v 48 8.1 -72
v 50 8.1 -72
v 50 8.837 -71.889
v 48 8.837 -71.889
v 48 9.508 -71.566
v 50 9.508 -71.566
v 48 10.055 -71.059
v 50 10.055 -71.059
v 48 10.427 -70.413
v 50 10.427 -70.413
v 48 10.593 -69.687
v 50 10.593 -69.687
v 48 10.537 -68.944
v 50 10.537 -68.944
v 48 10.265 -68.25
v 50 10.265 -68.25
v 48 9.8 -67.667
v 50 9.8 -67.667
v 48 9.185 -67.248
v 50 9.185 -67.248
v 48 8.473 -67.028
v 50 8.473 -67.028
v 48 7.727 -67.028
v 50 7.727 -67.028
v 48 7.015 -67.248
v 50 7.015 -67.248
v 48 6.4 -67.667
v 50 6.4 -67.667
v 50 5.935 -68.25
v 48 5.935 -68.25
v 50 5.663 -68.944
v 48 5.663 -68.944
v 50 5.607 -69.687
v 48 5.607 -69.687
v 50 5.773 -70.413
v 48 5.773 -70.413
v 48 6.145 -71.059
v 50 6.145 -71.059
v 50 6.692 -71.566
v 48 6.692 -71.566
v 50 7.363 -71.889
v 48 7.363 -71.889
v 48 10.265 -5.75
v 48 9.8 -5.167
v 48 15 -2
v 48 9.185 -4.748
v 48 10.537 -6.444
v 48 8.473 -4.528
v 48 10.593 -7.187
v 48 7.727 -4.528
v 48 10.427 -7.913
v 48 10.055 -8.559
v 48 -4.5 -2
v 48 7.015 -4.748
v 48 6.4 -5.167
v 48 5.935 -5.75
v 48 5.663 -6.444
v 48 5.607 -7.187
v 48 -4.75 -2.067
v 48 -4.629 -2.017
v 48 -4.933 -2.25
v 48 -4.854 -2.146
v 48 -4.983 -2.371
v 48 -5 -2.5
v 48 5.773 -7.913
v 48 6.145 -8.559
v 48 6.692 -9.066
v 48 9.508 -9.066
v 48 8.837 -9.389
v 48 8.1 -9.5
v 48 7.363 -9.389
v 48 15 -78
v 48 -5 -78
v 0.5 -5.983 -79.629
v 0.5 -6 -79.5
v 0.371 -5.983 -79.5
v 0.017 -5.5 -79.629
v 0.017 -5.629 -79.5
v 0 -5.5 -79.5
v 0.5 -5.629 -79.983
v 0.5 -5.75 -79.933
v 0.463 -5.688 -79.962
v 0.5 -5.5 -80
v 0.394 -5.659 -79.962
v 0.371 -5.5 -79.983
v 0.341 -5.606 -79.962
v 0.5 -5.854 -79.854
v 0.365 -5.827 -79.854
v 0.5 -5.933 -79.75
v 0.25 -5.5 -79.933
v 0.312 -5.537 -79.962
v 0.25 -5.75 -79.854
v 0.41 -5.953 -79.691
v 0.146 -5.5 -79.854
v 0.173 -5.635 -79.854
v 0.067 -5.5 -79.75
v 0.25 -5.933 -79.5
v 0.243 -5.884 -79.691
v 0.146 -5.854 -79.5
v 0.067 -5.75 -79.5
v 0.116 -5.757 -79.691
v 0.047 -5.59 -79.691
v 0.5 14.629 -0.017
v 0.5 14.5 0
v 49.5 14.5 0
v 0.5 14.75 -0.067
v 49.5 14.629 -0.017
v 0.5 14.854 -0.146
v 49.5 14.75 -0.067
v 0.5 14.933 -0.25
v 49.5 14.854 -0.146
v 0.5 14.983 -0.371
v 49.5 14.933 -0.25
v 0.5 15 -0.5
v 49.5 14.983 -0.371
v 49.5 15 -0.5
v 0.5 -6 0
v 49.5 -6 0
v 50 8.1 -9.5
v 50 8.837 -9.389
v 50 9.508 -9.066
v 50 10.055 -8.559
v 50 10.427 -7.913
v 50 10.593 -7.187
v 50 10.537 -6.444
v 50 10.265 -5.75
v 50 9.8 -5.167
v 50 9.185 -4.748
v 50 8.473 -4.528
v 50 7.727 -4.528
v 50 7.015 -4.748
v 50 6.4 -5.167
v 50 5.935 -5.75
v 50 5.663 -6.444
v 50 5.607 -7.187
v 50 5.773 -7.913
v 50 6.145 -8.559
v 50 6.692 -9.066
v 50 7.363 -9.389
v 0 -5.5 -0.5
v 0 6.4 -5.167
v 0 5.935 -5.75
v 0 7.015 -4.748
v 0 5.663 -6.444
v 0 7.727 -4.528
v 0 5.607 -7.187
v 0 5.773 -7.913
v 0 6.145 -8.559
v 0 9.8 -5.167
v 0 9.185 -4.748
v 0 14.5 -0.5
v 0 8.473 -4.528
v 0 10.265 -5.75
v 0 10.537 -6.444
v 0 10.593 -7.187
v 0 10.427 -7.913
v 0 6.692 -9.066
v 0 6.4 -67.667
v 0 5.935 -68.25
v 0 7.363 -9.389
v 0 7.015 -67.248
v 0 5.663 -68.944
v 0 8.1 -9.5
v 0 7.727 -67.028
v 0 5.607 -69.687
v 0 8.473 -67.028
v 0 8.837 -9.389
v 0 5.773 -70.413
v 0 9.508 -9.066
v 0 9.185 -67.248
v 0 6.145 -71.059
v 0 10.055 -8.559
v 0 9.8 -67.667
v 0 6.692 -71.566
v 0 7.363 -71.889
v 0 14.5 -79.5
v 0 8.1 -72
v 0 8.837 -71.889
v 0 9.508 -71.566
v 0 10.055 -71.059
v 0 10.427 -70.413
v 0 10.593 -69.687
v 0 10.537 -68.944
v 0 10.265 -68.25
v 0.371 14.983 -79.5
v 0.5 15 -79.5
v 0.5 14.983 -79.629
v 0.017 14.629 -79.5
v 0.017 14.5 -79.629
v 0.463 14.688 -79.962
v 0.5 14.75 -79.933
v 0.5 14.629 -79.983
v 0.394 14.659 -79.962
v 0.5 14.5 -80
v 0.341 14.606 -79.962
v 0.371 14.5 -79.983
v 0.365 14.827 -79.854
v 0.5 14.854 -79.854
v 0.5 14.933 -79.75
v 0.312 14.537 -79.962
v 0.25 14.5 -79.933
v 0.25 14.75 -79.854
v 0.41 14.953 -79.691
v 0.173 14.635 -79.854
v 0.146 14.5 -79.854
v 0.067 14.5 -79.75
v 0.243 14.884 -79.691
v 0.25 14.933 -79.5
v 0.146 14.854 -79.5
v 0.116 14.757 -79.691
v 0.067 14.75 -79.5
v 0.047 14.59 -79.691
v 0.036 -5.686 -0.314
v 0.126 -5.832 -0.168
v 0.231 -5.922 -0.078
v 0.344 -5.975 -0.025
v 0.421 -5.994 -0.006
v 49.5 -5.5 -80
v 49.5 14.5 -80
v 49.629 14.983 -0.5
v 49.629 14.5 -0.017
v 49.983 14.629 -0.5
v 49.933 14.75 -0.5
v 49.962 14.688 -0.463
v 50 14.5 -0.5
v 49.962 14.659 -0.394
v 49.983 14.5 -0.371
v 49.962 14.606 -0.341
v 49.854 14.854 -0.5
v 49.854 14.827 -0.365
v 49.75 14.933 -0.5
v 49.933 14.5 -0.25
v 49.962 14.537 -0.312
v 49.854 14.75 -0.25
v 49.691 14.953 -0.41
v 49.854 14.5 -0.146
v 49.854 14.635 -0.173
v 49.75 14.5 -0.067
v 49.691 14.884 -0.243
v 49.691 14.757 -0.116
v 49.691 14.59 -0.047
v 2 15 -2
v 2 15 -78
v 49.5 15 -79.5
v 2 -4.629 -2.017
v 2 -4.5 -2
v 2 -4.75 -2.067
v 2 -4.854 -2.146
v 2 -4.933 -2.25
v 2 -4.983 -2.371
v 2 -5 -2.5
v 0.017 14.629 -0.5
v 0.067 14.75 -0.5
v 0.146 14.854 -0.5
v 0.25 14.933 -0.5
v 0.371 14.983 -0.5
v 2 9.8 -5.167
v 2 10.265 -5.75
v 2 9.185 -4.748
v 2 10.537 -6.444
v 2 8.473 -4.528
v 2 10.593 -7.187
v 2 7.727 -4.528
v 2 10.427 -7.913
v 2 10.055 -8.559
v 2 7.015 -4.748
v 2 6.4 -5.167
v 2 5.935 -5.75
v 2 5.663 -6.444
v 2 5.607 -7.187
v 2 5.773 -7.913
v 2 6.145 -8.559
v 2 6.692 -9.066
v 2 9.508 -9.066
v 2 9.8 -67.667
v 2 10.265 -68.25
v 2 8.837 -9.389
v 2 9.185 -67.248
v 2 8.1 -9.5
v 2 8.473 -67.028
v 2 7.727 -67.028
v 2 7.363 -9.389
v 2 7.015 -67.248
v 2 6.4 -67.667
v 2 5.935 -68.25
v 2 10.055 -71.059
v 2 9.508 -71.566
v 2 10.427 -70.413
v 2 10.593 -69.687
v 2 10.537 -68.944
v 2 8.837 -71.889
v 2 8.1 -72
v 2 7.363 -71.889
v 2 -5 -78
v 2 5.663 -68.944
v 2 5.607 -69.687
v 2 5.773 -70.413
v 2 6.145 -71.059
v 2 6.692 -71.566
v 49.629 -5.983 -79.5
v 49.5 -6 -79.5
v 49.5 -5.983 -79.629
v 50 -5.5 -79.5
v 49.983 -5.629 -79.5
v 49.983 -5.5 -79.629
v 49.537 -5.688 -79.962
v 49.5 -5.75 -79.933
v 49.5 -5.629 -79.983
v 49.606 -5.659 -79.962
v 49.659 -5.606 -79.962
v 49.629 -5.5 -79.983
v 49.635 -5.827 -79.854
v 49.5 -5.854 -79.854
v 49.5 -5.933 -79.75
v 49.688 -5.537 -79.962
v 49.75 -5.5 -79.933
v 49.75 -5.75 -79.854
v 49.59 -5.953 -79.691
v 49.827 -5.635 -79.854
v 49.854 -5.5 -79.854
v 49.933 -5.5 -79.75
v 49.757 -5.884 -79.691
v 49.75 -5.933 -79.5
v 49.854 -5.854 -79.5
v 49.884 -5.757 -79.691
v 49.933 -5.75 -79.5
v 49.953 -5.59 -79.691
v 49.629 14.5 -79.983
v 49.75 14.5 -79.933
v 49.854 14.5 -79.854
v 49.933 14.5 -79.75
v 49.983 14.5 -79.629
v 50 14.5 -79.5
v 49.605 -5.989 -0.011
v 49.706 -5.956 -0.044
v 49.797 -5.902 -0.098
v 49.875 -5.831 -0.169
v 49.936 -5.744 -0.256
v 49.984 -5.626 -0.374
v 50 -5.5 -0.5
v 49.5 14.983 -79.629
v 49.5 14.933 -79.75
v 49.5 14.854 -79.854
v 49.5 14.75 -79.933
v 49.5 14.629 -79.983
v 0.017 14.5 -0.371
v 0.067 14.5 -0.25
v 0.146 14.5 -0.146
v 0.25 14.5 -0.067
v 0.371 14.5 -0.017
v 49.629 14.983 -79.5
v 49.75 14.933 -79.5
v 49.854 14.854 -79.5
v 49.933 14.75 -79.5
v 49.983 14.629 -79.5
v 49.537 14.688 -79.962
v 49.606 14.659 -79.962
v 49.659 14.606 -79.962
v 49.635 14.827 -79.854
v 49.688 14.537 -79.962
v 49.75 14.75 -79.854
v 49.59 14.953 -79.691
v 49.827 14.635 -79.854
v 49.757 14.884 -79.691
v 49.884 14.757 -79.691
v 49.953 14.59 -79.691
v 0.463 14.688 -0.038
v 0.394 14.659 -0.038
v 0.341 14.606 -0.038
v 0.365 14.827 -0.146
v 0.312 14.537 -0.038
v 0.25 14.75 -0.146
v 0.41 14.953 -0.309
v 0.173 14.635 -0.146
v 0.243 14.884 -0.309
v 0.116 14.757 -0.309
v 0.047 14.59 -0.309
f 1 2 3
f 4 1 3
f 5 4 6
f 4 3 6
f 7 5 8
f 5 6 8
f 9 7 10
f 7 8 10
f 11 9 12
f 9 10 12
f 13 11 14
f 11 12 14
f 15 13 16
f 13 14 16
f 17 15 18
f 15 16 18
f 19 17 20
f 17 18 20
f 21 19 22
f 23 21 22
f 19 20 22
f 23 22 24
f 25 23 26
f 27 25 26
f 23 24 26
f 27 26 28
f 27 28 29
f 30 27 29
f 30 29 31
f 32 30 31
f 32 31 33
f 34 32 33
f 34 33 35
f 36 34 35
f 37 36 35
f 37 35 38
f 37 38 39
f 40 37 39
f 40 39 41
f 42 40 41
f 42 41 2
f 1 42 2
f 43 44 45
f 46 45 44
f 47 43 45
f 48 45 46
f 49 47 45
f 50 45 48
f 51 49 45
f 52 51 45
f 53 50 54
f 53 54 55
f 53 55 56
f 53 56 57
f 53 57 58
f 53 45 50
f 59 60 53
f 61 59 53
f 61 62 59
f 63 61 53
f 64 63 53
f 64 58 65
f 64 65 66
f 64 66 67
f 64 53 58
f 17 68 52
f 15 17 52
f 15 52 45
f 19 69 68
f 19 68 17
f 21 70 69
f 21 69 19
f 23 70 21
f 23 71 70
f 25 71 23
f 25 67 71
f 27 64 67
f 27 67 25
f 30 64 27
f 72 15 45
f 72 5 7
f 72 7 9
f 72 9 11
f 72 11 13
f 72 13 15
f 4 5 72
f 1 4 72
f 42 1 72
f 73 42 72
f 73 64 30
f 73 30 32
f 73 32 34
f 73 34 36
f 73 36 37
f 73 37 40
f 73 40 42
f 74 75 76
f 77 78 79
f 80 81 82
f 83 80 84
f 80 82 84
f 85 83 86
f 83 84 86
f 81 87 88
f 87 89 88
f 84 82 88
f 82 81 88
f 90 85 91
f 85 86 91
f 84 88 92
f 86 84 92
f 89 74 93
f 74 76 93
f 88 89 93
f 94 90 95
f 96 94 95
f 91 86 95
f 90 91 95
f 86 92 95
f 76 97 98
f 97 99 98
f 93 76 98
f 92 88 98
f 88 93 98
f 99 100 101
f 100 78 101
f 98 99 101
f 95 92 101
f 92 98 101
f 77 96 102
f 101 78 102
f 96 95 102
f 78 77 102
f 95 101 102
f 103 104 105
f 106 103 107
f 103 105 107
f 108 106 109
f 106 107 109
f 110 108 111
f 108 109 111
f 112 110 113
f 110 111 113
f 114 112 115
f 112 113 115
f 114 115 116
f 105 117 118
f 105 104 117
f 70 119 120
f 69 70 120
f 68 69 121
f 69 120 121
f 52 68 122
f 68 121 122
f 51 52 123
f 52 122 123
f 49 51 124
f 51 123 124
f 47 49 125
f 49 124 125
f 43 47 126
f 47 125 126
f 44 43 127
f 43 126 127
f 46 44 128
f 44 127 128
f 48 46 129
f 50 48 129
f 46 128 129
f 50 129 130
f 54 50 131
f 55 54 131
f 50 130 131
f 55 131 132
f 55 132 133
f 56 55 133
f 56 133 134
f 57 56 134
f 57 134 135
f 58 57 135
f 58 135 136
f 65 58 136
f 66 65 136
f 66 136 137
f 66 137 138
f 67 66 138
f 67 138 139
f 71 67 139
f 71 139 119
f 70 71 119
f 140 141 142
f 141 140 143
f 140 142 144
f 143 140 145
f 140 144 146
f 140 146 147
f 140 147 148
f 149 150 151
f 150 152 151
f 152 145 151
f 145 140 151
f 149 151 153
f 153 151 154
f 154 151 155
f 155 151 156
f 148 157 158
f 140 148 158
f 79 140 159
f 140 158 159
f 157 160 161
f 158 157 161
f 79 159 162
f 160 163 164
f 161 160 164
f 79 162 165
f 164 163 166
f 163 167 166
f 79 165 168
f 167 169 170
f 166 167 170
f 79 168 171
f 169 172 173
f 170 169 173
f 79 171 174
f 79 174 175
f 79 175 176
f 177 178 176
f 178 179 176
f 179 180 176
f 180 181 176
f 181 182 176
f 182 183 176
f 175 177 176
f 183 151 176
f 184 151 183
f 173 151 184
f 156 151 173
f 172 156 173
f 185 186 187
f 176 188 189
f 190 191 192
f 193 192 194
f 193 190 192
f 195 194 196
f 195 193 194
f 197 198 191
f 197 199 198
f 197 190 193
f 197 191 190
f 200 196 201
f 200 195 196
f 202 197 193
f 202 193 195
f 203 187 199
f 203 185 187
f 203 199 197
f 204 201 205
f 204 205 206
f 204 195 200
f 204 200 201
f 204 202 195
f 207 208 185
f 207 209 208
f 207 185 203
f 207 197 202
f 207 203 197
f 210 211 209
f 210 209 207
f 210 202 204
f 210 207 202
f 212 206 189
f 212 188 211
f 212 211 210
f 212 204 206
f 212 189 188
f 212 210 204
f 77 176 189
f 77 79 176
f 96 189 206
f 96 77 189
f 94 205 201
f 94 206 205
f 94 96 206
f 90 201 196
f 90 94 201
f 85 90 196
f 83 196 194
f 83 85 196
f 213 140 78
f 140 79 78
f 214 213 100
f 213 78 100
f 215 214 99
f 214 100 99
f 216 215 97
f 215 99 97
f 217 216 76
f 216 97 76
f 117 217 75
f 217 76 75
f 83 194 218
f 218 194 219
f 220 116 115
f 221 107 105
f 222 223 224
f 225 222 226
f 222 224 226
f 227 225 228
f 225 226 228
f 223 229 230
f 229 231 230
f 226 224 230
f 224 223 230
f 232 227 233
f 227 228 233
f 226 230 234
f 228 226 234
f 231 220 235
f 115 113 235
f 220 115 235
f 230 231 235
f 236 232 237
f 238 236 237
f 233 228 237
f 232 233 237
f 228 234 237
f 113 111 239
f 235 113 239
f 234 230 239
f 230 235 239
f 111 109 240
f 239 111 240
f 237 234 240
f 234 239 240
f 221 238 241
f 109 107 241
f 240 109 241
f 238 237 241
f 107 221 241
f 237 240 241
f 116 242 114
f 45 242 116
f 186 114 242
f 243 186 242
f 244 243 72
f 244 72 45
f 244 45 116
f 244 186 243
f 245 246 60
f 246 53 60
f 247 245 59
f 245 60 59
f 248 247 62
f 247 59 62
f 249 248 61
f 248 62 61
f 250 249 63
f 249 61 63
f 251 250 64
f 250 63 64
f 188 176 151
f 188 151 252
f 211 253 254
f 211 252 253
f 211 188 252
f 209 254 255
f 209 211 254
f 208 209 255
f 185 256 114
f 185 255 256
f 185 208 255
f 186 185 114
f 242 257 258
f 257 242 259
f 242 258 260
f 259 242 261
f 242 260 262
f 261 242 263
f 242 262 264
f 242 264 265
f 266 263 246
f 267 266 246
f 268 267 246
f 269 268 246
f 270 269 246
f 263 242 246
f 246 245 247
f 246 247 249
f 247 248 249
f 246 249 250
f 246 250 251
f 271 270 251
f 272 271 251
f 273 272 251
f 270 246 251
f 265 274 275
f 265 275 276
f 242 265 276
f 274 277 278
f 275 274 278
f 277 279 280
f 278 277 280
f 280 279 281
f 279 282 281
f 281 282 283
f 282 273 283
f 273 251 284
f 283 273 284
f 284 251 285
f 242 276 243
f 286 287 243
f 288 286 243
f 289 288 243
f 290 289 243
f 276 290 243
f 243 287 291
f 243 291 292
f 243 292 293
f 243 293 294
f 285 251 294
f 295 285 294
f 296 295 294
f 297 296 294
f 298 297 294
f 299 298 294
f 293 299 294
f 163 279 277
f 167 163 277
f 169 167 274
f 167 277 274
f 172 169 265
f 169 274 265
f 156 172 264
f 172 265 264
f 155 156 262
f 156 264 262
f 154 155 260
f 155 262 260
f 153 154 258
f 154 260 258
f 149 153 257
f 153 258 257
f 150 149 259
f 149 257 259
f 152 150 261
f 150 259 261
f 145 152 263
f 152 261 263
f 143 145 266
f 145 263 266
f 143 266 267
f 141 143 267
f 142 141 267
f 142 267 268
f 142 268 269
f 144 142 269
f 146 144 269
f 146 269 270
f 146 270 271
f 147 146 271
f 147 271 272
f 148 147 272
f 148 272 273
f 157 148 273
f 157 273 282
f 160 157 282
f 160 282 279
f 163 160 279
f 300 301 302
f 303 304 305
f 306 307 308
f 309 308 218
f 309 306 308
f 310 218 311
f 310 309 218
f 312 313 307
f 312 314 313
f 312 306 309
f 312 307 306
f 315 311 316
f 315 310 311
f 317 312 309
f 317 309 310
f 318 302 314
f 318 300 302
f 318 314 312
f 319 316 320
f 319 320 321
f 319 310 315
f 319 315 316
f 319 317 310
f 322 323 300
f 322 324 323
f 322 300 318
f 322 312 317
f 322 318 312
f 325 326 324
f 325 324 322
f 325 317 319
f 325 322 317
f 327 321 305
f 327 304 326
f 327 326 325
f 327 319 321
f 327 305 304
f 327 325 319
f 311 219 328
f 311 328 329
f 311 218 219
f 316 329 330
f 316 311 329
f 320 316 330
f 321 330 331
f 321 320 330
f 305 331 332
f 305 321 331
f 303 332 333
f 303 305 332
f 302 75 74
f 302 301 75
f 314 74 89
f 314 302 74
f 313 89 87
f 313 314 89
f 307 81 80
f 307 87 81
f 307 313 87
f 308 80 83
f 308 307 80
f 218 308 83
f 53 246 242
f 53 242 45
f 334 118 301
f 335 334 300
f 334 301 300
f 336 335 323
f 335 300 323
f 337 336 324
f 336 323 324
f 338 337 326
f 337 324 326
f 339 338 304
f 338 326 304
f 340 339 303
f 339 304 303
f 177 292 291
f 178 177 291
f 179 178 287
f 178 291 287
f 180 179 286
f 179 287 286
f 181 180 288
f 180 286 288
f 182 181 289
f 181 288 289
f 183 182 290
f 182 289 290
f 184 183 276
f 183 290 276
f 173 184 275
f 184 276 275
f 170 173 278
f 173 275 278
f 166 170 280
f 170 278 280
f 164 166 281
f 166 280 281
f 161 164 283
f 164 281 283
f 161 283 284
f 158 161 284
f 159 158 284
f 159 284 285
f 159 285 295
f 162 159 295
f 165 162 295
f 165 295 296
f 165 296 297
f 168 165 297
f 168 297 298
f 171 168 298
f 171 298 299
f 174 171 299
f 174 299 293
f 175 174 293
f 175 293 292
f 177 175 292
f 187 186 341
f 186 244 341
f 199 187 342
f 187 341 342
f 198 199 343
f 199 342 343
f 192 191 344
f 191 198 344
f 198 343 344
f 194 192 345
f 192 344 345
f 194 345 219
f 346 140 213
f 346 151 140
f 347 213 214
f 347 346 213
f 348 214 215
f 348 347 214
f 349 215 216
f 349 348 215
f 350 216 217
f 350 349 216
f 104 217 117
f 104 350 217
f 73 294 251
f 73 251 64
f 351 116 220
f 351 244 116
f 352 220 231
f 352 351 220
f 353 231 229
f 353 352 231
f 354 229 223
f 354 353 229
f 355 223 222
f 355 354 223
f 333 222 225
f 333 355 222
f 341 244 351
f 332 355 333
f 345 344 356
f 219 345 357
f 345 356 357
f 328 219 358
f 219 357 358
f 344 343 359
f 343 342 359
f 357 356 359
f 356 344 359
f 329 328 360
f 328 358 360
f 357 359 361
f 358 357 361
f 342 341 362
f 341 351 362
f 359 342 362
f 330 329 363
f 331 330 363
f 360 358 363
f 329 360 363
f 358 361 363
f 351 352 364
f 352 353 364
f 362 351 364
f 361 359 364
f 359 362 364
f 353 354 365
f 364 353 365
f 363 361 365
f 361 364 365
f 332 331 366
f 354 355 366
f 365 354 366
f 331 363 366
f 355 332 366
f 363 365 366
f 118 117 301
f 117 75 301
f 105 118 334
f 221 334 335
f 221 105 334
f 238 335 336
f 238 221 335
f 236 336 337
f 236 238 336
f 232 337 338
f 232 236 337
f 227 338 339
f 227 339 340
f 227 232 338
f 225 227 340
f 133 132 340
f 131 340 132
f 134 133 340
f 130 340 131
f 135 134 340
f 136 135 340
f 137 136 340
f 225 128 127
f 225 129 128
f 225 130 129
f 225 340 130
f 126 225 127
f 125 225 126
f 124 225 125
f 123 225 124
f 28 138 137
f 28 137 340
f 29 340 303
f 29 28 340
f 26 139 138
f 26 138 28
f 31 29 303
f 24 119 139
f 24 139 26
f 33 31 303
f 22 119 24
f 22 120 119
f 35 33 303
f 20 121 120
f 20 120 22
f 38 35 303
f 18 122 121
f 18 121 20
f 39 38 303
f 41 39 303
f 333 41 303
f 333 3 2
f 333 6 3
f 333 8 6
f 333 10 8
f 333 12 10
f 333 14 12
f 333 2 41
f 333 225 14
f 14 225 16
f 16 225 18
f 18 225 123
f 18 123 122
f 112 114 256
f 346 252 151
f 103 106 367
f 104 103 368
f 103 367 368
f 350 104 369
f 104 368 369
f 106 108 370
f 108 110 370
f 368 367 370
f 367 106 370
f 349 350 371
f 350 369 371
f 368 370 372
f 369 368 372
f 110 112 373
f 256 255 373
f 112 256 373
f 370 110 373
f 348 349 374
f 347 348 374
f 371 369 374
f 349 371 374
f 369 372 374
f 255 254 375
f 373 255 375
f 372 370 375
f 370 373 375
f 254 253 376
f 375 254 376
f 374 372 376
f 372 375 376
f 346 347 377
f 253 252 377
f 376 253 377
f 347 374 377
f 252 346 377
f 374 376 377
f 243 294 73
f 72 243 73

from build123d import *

# Parameters (mm, degrees)
SKETCH1_W           = 50
SKETCH1_H           = 80
SKETCH1_W_2         = 46
SKETCH1_H_2         = 76
BOSS_EXTRUDE1_DEPTH = 5
SKETCH1_2_W         = 46
SKETCH1_2_H         = 76
BOSS_EXTRUDE2_DEPTH = 5
SKETCH1_3_W         = 50
SKETCH1_3_H         = 80
SKETCH1_3_W_2       = 46
SKETCH1_3_H_2       = 76
BOSS_EXTRUDE3_DEPTH = 10
SKETCH1_4_W         = 46
SKETCH1_4_H         = 76
CUT_EXTRUDE2_DEPTH  = 49
SKETCH3_R           = 2.5
CUT_EXTRUDE3_DEPTH  = 49
BOSS_EXTRUDE4_START = -5
SKETCH1_5_W         = 46
SKETCH1_5_H         = 76
BOSS_EXTRUDE4_DEPTH = 1
BOSS_EXTRUDE5_START = -5
SKETCH1_6_W         = 50
SKETCH1_6_H         = 80
SKETCH1_6_W_2       = 46
SKETCH1_6_H_2       = 76
BOSS_EXTRUDE5_DEPTH = 1
SKETCH1_7_W         = 50
SKETCH1_7_H         = 80
SKETCH1_7_W_2       = 46
SKETCH1_7_H_2       = 76
BOSS_EXTRUDE6_DEPTH = 15
SKETCH3_2_R         = 2.5
CUT_EXTRUDE4_DEPTH  = 61
FILLET1_R           = 0.5


with BuildPart() as part:
    # Sketch1 → Boss-Extrude1 (new body)
    with BuildSketch(Plane(origin=(0, 0, 0), x_dir=(1, 0, 0), z_dir=(0, 1, 0))):
        with Locations((25, 40)):
            Rectangle(SKETCH1_W, SKETCH1_H)
        with Locations((25, 40)):
            Rectangle(SKETCH1_W_2, SKETCH1_H_2, mode=Mode.SUBTRACT)
    extrude(amount=-BOSS_EXTRUDE1_DEPTH)

    # Sketch1<2> → Boss-Extrude2 (add)
    with BuildSketch(Plane(origin=(0, 0, 0), x_dir=(1, 0, 0), z_dir=(0, 1, 0))):
        with Locations((25, 40)):
            Rectangle(SKETCH1_2_W, SKETCH1_2_H)
    extrude(amount=-BOSS_EXTRUDE2_DEPTH)

    # Sketch1<3> → Boss-Extrude3 (add)
    with BuildSketch(Plane(origin=(0, 0, 0), x_dir=(1, 0, 0), z_dir=(0, 1, 0))):
        with Locations((25, 40)):
            Rectangle(SKETCH1_3_W, SKETCH1_3_H)
        with Locations((25, 40)):
            Rectangle(SKETCH1_3_W_2, SKETCH1_3_H_2, mode=Mode.SUBTRACT)
    extrude(amount=BOSS_EXTRUDE3_DEPTH)

    # Sketch1<4> → Cut-Extrude2 (cut)
    with BuildSketch(Plane(origin=(0, 0, 0), x_dir=(1, 0, 0), z_dir=(0, 1, 0))):
        with Locations((25, 40)):
            Rectangle(SKETCH1_4_W, SKETCH1_4_H)
    extrude(amount=-CUT_EXTRUDE2_DEPTH, mode=Mode.SUBTRACT)

    # Sketch3 → Cut-Extrude3 (cut)
    with BuildSketch(Plane(origin=(50, 0, 0), x_dir=(0, 0, -1), z_dir=(1, 0, 0))):
        with Locations((7, 8.1)):
            Circle(SKETCH3_R)
        with Locations((69.5, 8.1)):
            Circle(SKETCH3_R)
    extrude(amount=-CUT_EXTRUDE3_DEPTH, mode=Mode.SUBTRACT)



with BuildPart() as body_2:
    # Sketch1<5> → Boss-Extrude4 (new body)
    with BuildSketch(Plane(origin=(0, 0, 0), x_dir=(1, 0, 0), z_dir=(0, 1, 0)).offset(BOSS_EXTRUDE4_START)):
        with Locations((25, 40)):
            Rectangle(SKETCH1_5_W, SKETCH1_5_H)
    extrude(amount=-BOSS_EXTRUDE4_DEPTH)


with BuildPart() as part_1:
    add(part.part)

    add(body_2.part)  # Boss-Extrude5 merges body 2
    # Sketch1<6> → Boss-Extrude5 (add)
    with BuildSketch(Plane(origin=(0, 0, 0), x_dir=(1, 0, 0), z_dir=(0, 1, 0)).offset(BOSS_EXTRUDE5_START)):
        with Locations((25, 40)):
            Rectangle(SKETCH1_6_W, SKETCH1_6_H)
        with Locations((25, 40)):
            Rectangle(SKETCH1_6_W_2, SKETCH1_6_H_2, mode=Mode.SUBTRACT)
    extrude(amount=-BOSS_EXTRUDE5_DEPTH)

    # Sketch1<7> → Boss-Extrude6 (add)
    with BuildSketch(Plane(origin=(0, 0, 0), x_dir=(1, 0, 0), z_dir=(0, 1, 0))):
        with Locations((25, 40)):
            Rectangle(SKETCH1_7_W, SKETCH1_7_H)
        with Locations((25, 40)):
            Rectangle(SKETCH1_7_W_2, SKETCH1_7_H_2, mode=Mode.SUBTRACT)
    extrude(amount=BOSS_EXTRUDE6_DEPTH)

    # Sketch3<2> → Cut-Extrude4 (cut)
    with BuildSketch(Plane(origin=(50, 0, 0), x_dir=(0, 0, -1), z_dir=(1, 0, 0))):
        with Locations((7, 8.1)):
            Circle(SKETCH3_2_R)
        with Locations((69.5, 8.1)):
            Circle(SKETCH3_2_R)
    extrude(amount=-CUT_EXTRUDE4_DEPTH, mode=Mode.SUBTRACT)

    # Fillet1
    fillet1_edges = [part_1.edges().sort_by_distance(p)[0] for p in [
        (50, -6, -40),
        (0, -6, -40),
        (25, -6, -80),
        (25, -5, -2),
        (0, 15, -40),
        (25, 15, 0),
        (50, 15, -40),
        (25, 15, -80),
        (0, 4.5, -80),
        (50, 4.5, -80),
        (50, 4.5, 0),
        (0, 4.5, 0),
    ]]
    fillet(fillet1_edges, radius=FILLET1_R)


solid = part_1.part
